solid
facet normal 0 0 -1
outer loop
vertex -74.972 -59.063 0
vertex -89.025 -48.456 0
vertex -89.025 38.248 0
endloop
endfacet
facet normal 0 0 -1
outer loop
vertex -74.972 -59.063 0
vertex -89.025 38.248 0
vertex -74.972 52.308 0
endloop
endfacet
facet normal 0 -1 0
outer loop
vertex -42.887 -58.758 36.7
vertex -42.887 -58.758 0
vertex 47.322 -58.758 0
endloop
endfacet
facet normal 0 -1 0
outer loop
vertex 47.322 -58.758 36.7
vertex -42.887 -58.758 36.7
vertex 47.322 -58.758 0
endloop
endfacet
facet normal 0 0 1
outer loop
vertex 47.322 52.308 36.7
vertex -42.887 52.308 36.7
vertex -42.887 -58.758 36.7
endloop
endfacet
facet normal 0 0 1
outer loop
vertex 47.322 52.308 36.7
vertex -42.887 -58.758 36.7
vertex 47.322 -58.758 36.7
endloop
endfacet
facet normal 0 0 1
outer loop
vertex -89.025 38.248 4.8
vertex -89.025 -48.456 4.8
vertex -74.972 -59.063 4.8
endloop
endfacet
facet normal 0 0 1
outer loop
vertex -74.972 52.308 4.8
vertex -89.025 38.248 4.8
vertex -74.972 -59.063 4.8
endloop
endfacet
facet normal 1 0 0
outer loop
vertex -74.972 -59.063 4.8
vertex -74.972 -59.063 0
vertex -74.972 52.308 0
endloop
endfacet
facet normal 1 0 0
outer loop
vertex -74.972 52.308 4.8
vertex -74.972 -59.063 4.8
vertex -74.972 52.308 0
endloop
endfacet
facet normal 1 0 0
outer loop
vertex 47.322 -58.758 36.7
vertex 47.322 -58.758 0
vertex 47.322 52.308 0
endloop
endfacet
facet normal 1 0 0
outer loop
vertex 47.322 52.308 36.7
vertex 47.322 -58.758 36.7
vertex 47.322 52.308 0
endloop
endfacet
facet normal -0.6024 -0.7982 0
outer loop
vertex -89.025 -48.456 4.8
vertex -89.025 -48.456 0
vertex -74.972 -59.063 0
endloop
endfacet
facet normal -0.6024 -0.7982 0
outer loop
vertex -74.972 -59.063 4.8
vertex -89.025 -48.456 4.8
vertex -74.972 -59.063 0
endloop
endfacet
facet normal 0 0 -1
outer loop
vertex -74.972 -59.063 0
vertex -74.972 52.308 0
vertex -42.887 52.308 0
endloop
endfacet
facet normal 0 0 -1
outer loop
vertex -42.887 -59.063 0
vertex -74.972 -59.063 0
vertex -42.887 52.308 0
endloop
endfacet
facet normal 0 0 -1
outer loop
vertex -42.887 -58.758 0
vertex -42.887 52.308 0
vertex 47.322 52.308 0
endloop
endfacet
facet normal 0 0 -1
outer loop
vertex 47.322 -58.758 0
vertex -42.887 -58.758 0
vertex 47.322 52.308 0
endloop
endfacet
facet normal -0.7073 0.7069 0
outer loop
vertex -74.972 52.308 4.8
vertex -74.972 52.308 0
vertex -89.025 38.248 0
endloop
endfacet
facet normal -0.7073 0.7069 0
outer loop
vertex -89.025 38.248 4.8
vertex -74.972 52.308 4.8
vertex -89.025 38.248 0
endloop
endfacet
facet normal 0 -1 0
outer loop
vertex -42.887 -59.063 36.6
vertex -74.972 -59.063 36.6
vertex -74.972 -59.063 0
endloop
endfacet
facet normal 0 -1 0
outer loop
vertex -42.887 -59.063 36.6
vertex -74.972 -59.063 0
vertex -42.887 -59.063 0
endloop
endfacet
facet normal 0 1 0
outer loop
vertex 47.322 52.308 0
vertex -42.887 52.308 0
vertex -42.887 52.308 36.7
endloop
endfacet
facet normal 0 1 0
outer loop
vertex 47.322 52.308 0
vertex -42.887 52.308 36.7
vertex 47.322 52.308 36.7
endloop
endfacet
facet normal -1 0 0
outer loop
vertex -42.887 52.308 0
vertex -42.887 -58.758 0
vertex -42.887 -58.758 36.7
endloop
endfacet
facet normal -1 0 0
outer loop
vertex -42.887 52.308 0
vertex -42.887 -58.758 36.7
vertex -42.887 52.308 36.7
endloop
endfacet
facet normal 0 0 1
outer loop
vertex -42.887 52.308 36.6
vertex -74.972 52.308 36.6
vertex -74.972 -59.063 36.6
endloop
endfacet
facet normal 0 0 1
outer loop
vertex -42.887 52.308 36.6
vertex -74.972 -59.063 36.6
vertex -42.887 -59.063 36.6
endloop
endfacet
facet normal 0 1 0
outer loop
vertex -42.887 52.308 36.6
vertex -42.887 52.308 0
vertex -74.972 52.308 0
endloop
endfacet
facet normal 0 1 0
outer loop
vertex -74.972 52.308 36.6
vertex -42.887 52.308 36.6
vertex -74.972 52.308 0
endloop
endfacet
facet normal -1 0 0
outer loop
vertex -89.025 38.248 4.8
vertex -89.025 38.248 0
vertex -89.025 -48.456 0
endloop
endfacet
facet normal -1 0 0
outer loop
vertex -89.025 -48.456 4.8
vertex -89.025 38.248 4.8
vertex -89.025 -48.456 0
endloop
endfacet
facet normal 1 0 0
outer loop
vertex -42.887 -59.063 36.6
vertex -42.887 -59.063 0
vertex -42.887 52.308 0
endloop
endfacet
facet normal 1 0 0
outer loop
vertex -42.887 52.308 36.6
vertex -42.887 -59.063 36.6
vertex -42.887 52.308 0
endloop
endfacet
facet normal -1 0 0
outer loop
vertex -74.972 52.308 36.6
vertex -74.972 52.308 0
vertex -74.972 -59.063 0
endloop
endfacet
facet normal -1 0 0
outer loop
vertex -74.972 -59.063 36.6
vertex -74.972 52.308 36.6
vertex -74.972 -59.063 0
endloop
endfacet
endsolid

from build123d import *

# Parameters (mm, degrees)
F0_W     = 90.209164
F0_H     = 111.066584
F1_DEPTH = 36.7
F2_DEPTH = 36.6
F3_DEPTH = 4.8


with BuildPart() as f1:
    # F0 (on Top) → F1 (new body)
    with BuildSketch(Plane.XY):
        with Locations((2.21774, -3.225146)):
            Rectangle(F0_W, F0_H)
    extrude(amount=F1_DEPTH)


with BuildPart() as f2:
    # F0 (on Top) → F2 (new body)
    with BuildSketch(Plane.XY):
        Polygon((-42.886842, -58.758438), (-42.886842, 52.308146), (-74.971594, 52.308146), (-74.971594, -59.062503), (-42.886842, -59.062503), align=None)
    extrude(amount=F2_DEPTH)


with BuildPart() as f3:
    # F0 (on Top) → F3 (new body)
    with BuildSketch(Plane.XY):
        Polygon((-74.971594, -59.062503), (-74.971594, 52.308146), (-89.024626, 38.248107), (-89.024626, -48.456442), align=None)
    extrude(amount=F3_DEPTH)


solid = Compound([f1.part, f2.part, f3.part])
